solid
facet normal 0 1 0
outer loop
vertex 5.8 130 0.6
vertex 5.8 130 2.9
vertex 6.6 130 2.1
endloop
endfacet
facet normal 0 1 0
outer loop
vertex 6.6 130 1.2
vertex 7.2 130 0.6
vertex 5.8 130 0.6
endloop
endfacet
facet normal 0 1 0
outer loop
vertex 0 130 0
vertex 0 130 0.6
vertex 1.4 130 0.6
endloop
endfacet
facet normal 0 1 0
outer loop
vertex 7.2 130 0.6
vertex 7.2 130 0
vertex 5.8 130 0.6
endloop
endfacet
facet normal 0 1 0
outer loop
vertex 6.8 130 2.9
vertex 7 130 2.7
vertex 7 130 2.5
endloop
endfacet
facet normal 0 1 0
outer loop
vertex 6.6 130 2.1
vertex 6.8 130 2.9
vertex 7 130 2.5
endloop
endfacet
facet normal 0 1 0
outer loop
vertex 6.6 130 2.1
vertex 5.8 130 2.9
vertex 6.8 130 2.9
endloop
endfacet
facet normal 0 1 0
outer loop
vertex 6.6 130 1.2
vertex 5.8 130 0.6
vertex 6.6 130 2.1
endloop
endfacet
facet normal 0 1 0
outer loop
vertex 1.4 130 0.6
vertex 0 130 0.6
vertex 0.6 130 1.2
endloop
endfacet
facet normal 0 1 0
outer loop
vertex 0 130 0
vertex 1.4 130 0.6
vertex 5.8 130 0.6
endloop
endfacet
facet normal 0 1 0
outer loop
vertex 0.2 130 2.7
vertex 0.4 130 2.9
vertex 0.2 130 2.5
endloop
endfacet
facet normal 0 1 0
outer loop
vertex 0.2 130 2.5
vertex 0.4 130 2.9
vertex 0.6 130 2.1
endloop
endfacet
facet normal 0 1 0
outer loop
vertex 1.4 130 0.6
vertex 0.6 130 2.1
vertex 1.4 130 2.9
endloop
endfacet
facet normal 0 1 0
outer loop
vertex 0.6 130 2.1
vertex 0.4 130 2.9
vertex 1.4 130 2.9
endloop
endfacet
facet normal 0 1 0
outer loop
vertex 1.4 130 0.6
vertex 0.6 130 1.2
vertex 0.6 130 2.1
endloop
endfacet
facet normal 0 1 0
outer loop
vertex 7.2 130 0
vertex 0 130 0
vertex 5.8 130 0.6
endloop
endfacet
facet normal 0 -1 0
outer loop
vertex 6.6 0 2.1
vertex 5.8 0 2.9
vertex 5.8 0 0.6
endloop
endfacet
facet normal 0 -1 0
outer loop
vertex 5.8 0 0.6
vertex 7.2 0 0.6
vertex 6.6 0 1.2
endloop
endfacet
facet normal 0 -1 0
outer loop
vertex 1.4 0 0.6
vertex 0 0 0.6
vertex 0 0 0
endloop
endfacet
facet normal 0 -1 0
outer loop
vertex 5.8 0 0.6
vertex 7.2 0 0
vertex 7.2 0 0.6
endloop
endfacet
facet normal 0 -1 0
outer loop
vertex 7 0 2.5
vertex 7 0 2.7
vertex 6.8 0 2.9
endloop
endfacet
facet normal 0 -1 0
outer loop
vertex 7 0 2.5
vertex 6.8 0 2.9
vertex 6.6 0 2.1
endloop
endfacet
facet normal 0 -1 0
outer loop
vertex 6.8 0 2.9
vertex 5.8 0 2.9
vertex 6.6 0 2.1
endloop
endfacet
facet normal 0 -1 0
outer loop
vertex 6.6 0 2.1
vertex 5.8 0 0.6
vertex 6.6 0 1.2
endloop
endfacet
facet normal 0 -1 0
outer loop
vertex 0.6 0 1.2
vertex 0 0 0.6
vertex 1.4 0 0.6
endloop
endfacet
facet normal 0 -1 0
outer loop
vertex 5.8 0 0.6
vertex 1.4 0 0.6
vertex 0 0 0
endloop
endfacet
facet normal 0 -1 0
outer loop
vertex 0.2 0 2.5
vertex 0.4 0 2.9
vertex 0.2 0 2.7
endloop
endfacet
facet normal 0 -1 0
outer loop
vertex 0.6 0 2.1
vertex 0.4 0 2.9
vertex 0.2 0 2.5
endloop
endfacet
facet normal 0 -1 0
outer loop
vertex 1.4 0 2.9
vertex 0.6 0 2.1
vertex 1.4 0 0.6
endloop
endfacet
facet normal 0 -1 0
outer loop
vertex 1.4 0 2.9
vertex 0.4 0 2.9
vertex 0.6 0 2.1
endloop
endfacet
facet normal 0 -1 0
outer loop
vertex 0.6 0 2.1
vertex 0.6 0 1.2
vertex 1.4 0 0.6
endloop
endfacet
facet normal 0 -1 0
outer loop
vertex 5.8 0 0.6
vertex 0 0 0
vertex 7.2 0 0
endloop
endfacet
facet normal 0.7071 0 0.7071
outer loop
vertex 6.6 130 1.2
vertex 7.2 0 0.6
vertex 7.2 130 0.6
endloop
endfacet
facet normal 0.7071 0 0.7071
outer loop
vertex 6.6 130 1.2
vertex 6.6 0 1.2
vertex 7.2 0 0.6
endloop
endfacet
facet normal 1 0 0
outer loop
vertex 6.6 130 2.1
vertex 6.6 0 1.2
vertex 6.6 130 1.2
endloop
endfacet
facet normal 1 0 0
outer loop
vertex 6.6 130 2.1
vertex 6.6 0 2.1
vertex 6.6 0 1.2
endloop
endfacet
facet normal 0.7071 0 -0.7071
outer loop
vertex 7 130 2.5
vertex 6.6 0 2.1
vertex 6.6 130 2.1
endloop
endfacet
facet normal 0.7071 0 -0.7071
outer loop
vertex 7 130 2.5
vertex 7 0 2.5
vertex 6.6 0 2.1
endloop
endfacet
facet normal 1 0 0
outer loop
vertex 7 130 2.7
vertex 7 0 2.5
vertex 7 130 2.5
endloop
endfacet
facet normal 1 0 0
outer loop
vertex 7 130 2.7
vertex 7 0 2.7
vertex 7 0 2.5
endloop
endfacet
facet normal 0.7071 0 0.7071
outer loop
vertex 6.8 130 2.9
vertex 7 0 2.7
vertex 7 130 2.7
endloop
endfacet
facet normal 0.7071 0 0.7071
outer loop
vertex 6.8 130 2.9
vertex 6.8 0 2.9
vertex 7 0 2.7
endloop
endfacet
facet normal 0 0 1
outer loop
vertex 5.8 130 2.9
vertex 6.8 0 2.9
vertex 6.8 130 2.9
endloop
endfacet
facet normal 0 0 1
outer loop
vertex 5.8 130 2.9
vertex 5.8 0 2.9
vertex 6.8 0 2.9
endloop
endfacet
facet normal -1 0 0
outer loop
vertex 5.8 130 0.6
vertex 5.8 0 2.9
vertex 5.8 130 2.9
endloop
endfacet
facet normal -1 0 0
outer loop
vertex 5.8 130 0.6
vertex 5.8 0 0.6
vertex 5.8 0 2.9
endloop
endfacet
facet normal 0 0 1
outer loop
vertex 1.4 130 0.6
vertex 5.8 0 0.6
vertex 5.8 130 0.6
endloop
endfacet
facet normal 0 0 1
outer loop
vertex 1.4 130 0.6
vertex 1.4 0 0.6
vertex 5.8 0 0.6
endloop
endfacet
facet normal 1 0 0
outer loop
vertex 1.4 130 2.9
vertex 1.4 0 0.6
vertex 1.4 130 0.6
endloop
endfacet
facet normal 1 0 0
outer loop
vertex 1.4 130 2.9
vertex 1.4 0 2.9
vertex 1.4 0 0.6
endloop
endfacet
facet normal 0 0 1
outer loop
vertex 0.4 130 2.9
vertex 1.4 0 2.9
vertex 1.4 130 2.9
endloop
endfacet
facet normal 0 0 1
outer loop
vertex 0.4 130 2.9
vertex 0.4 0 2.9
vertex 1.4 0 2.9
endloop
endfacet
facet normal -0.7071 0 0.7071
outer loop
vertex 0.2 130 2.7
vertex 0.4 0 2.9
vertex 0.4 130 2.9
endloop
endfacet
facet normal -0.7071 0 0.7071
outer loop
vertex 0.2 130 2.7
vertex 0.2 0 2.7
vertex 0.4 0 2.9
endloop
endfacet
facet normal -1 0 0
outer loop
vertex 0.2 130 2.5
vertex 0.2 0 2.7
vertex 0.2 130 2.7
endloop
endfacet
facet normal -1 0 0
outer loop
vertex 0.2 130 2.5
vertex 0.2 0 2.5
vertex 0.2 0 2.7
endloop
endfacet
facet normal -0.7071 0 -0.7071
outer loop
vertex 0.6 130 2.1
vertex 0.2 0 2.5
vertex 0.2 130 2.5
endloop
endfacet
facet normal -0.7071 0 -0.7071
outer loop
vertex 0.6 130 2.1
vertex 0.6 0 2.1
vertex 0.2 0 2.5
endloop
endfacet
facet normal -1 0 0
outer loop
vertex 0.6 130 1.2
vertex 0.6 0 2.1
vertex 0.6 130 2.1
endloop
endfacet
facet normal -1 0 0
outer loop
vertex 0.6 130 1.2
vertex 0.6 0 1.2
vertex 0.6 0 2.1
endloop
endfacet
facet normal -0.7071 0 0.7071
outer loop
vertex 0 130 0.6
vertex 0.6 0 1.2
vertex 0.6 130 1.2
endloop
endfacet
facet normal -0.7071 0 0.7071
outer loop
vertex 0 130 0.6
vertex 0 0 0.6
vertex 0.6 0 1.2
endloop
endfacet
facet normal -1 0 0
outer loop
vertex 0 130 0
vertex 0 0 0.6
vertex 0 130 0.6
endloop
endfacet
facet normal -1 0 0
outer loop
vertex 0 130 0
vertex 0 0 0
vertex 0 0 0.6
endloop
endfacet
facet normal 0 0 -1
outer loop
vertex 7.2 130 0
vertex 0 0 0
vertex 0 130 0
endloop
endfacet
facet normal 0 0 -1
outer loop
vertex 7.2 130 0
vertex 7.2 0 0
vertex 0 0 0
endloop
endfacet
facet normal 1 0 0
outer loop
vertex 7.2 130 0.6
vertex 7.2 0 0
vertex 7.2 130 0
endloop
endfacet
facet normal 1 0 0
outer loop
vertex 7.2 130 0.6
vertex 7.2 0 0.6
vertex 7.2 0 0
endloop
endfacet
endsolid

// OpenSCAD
// (c) 2020 entrhopi - Alexander Freynik
// https://www.thingiverse.com/entrhopi/designs
// Parametric 2020 Extrusion Cover

$length = 130;

translate([0, $length, 0]) rotate(90, [1, 0, 0]) linear_extrude($length) polygon(
    points = [
        [0.0, 0.0],
        [7.2, 0.0],
        [7.2, 0.6],
        [6.6, 1.2],
        [6.6, 2.1],
        [7.0, 2.5],
        [7.0, 2.7],
        [6.8, 2.9],
        [5.8, 2.9],
        [5.8, 0.6],
        [1.4, 0.6],
        [1.4, 2.9],
        [0.4, 2.9],
        [0.2, 2.7],
        [0.2, 2.5],
        [0.6, 2.1],
        [0.6, 1.2],
        [0.0, 0.6]
    ]
);
